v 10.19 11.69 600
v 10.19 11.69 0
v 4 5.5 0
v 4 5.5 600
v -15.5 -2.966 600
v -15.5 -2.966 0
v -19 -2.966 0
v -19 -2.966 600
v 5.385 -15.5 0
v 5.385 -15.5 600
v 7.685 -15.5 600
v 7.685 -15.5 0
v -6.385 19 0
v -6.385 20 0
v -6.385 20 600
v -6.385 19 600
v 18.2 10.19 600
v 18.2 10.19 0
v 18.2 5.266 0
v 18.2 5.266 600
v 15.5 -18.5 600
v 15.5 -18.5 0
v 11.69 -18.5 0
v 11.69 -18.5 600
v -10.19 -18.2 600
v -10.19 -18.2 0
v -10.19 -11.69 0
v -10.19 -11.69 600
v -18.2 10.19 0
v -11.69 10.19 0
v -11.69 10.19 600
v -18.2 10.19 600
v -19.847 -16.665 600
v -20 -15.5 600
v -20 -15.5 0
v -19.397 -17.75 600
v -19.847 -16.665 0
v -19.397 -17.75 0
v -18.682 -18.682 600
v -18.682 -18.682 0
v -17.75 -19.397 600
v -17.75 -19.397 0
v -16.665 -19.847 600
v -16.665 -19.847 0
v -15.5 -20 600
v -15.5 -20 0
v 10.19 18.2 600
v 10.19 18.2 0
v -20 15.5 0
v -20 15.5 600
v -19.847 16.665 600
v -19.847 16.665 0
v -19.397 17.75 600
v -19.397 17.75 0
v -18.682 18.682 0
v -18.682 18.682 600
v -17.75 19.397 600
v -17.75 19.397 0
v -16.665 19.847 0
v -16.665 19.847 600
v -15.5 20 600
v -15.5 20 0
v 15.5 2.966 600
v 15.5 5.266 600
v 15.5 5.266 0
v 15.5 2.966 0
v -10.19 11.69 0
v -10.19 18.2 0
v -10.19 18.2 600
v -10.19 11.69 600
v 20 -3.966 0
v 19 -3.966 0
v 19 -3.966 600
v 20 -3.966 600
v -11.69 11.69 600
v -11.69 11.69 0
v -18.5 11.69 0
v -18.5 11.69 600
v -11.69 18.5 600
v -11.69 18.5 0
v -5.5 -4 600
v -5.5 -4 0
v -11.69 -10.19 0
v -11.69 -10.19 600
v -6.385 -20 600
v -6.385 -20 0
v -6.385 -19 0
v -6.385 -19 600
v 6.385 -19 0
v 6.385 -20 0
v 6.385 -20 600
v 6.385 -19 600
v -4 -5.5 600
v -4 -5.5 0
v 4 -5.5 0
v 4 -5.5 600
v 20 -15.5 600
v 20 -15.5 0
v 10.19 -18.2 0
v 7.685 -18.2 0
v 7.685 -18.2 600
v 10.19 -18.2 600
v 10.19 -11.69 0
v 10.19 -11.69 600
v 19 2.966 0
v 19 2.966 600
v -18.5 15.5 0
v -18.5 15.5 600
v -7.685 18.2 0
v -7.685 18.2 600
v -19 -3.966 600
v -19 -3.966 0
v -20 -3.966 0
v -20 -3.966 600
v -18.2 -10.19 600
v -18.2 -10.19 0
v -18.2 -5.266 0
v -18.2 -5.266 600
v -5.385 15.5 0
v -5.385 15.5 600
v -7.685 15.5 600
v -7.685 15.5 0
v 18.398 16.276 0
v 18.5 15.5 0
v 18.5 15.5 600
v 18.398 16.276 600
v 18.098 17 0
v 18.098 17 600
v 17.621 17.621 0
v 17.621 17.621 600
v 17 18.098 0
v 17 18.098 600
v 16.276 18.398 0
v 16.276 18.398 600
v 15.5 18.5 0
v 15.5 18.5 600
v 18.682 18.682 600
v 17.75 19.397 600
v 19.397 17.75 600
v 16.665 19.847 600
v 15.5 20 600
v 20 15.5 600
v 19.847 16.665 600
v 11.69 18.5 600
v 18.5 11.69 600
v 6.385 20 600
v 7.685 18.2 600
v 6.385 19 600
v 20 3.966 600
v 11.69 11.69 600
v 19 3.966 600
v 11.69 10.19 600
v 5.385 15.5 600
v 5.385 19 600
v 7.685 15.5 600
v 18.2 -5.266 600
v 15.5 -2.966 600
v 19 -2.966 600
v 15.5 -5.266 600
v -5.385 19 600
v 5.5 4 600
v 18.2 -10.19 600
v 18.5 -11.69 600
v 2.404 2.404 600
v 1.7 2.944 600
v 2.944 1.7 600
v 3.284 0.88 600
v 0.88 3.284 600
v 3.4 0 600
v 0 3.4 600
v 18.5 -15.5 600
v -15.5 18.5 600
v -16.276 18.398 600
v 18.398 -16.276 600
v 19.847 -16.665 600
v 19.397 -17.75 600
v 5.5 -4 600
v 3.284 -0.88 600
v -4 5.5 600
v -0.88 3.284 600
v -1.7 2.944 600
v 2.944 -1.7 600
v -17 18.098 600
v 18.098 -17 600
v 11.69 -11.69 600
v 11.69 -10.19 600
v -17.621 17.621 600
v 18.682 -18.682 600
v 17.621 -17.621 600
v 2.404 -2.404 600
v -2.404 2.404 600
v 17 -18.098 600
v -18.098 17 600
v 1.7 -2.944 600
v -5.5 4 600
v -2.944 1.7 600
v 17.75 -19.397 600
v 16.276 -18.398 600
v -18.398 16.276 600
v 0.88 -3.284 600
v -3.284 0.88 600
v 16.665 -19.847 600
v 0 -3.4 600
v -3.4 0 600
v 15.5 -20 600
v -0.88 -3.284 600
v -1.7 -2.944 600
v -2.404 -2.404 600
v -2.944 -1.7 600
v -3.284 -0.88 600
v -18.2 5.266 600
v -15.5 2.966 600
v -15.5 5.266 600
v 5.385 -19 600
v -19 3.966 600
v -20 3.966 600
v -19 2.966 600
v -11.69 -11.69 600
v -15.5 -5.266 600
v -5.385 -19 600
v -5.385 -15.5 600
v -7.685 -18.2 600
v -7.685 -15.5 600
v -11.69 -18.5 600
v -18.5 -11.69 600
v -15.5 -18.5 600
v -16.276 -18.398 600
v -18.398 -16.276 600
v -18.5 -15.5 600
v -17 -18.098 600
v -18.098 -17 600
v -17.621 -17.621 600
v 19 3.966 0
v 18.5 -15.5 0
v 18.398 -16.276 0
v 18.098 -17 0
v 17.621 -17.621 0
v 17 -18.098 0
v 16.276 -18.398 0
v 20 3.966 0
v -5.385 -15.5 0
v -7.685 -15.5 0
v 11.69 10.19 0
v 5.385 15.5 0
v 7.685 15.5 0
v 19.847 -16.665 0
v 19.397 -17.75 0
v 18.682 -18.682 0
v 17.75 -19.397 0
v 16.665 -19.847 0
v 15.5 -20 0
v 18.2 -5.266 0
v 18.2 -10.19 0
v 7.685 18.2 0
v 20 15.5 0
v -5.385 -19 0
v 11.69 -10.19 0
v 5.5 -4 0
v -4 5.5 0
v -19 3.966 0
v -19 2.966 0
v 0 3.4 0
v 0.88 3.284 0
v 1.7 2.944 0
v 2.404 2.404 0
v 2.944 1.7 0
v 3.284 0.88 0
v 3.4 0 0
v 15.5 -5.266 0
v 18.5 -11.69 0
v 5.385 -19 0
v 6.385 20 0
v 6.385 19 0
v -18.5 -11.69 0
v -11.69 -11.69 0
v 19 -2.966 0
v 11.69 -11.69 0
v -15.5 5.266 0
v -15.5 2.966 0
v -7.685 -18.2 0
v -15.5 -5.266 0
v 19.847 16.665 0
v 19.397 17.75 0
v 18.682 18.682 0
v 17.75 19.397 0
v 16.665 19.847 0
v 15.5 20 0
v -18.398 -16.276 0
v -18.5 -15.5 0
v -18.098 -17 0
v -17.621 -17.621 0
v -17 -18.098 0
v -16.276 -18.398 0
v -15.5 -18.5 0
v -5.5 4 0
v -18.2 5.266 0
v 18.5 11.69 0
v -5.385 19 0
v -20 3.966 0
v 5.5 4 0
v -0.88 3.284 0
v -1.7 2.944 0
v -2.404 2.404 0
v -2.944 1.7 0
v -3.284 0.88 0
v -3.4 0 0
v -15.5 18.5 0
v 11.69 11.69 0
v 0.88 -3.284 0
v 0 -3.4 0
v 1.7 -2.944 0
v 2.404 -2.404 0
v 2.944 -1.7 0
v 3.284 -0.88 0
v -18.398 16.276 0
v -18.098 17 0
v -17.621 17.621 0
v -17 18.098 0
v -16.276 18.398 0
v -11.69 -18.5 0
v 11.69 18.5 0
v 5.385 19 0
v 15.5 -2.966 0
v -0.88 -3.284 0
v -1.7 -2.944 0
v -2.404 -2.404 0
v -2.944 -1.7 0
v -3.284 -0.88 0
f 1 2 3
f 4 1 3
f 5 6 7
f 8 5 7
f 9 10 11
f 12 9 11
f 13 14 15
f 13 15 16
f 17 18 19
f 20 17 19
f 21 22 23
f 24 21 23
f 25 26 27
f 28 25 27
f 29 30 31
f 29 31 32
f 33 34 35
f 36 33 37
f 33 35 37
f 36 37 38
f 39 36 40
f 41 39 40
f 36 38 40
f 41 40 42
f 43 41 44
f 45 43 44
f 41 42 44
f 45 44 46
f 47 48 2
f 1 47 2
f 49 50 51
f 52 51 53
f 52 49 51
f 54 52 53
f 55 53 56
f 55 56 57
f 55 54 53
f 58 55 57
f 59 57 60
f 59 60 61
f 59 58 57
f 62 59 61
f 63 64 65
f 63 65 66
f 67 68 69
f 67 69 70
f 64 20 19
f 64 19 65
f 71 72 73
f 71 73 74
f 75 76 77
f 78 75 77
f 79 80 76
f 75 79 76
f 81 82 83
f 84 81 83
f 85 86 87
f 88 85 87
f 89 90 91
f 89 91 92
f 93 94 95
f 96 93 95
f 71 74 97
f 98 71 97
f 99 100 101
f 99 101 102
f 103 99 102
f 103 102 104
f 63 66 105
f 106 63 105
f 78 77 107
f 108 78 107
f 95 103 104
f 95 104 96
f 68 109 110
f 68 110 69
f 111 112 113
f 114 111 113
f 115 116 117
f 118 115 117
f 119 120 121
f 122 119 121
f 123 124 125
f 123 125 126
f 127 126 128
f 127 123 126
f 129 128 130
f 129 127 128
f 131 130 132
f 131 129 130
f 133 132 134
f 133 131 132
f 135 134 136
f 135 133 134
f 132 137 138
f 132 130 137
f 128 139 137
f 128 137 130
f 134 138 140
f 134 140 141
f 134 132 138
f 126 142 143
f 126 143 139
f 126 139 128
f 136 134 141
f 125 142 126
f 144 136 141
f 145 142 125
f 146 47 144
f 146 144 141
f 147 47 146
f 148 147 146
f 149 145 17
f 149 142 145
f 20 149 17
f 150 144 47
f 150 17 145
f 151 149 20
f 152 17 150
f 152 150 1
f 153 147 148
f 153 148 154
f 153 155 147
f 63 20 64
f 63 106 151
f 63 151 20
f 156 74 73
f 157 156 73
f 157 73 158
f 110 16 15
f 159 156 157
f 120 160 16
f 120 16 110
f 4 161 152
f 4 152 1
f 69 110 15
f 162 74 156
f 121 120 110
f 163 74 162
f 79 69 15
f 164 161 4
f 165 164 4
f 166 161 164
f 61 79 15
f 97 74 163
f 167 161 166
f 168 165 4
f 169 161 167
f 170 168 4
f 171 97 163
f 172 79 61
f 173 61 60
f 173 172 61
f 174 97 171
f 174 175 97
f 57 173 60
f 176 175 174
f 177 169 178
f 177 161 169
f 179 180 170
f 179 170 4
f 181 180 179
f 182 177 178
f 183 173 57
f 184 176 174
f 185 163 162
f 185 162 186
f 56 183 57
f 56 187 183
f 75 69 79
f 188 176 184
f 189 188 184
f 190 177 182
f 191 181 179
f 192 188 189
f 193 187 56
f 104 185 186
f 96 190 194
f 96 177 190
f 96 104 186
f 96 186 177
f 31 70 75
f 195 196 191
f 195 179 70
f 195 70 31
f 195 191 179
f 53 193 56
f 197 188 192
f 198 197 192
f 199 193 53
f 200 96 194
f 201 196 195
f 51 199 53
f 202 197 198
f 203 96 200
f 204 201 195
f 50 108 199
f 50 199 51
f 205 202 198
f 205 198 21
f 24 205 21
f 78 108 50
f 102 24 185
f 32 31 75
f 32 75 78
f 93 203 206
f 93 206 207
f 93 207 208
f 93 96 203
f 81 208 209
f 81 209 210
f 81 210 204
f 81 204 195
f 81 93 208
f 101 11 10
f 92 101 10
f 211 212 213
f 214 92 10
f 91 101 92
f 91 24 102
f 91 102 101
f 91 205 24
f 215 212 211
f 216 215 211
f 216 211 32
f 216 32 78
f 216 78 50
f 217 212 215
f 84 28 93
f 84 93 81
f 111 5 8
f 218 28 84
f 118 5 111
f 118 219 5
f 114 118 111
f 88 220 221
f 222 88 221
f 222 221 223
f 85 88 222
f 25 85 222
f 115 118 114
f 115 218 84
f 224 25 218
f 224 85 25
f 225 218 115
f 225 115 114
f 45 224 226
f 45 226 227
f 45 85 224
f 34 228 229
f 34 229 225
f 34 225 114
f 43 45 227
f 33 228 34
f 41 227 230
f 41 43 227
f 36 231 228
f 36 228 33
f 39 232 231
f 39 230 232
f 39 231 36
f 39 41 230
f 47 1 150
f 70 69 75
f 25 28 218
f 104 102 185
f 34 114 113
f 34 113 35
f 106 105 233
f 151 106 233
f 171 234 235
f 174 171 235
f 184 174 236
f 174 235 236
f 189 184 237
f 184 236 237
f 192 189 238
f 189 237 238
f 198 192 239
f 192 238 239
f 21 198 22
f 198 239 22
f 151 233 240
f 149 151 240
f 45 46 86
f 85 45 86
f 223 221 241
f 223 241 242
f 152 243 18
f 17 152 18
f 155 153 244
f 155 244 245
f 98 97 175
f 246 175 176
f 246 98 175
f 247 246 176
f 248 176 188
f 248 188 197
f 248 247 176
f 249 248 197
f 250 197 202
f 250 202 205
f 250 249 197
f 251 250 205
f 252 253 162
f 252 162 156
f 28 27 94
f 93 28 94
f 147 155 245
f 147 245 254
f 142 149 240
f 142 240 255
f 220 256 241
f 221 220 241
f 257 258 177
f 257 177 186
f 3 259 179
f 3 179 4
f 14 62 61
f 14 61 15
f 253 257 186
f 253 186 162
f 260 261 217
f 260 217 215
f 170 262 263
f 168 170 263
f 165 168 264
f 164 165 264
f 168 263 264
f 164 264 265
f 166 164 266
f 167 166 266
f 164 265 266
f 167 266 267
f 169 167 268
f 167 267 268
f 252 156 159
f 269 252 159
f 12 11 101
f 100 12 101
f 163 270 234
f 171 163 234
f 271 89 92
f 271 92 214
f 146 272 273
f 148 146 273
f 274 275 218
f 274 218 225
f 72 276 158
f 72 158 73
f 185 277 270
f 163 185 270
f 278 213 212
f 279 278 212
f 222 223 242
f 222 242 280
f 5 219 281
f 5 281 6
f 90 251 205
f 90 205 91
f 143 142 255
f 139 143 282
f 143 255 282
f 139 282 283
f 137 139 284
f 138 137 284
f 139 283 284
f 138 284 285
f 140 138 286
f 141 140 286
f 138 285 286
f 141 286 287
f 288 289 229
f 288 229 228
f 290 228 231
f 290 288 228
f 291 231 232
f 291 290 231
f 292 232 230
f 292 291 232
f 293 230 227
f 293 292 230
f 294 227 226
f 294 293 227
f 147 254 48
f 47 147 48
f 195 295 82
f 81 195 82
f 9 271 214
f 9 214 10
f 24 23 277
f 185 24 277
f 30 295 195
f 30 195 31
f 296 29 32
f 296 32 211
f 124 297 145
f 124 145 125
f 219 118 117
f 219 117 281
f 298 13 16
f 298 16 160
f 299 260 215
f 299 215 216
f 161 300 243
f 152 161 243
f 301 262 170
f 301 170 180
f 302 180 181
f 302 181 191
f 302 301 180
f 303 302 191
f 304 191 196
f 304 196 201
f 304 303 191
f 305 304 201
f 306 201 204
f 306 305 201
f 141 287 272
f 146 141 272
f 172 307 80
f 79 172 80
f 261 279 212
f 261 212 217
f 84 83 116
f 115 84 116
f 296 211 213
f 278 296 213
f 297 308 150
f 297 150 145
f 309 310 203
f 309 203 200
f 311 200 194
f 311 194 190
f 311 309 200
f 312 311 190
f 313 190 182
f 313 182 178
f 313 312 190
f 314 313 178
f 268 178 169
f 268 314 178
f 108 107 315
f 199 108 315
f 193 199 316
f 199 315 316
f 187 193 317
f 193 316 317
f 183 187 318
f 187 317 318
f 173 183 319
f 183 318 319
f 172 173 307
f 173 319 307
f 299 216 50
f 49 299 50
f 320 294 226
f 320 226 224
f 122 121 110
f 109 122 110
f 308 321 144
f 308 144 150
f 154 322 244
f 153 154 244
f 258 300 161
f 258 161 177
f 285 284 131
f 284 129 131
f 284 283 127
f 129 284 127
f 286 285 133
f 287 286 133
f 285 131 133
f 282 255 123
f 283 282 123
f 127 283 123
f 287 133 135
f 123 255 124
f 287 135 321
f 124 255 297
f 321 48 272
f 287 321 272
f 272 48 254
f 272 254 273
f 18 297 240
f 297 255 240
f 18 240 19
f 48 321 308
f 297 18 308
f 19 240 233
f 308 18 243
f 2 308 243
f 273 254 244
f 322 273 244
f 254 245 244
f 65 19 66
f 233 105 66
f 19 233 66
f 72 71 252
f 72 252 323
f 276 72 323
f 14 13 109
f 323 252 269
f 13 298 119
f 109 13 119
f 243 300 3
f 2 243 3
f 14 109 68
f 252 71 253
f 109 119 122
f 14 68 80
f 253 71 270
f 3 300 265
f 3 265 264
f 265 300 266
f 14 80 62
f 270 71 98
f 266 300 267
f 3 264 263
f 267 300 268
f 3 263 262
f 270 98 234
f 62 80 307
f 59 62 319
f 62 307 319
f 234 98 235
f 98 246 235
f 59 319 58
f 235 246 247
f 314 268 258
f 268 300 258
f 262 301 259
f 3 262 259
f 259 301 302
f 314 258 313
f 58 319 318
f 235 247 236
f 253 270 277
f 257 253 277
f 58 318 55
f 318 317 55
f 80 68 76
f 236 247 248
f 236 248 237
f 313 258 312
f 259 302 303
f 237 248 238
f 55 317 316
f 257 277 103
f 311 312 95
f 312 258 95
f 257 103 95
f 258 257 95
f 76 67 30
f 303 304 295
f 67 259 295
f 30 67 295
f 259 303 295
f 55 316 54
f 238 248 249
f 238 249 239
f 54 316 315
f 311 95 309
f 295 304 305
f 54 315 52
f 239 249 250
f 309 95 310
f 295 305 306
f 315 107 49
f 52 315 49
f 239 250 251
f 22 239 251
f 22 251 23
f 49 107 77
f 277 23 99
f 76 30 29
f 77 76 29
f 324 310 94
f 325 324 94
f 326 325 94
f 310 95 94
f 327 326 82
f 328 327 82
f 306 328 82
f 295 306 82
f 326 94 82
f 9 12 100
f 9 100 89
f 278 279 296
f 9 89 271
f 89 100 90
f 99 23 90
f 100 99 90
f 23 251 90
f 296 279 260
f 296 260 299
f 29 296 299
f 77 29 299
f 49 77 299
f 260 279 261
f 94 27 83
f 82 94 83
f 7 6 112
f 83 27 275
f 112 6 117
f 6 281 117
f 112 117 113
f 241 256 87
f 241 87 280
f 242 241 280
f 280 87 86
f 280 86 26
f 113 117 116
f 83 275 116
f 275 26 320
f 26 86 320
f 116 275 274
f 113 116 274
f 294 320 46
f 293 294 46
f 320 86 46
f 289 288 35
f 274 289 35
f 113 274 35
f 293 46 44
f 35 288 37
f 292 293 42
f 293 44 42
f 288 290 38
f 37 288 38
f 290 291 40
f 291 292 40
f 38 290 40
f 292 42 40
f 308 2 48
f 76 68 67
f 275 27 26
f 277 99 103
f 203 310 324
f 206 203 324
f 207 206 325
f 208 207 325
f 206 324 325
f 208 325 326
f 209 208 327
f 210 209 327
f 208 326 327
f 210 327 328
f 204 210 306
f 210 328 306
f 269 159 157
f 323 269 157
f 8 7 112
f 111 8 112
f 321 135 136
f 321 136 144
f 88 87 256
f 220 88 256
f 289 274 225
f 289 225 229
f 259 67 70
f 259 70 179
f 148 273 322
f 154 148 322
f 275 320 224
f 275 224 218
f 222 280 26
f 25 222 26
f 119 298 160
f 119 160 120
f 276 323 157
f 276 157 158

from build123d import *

# Parameters (mm, degrees)
BOSS_EXTRUDE1_DEPTH  = 600
MIRROR3_COPY_1_DEPTH = 600
MIRROR3_COPY_2_DEPTH = 600


with BuildPart() as part:
    # Sketch1 → Boss-Extrude1 (new body)
    with BuildSketch(Plane.XY):
        with BuildLine():
            Line((3.4, 0), (5.5, 0))
            Line((5.5, 0), (5.5, 4))
            Line((5.5, 4), (11.69, 10.19))
            Line((11.69, 10.19), (18.2, 10.19))
            Line((18.2, 10.19), (18.2, 5.265595036))
            Line((18.2, 5.265595036), (15.5, 5.265595036))
            Line((15.5, 5.265595036), (15.5, 2.965595036))
            Line((15.5, 2.965595036), (19, 2.965595036))
            Line((19, 2.965595036), (19, 3.965595036))
            Line((19, 3.965595036), (20, 3.965595036))
            Line((20, 3.965595036), (20, 15.5))
            ThreePointArc((20, 15.5), (18.681980515, 18.681980515), (15.5, 20))
            Line((15.5, 20), (6.385304712, 20))
            Line((6.385304712, 20), (6.385304712, 19))
            Line((6.385304712, 19), (5.385304712, 19))
            Line((5.385304712, 19), (5.385304712, 15.5))
            Line((5.385304712, 15.5), (7.685304712, 15.5))
            Line((7.685304712, 15.5), (7.685304712, 18.2))
            Line((7.685304712, 18.2), (10.19, 18.2))
            Line((10.19, 18.2), (10.19, 11.69))
            Line((10.19, 11.69), (4, 5.5))
            Line((4, 5.5), (0, 5.5))
            Line((0, 5.5), (0, 3.4))
            ThreePointArc((0, 3.4), (2.404163056, 2.404163056), (3.4, 0))
        make_face()
        with BuildLine():
            Line((18.5, 11.69), (18.5, 15.5))
            ThreePointArc((18.5, 15.5), (17.621320344, 17.621320344), (15.5, 18.5))
            Line((15.5, 18.5), (11.69, 18.5))
            Line((11.69, 18.5), (11.69, 11.69))
            Line((11.69, 11.69), (18.5, 11.69))
        make_face(mode=Mode.SUBTRACT)
    boss_extrude1 = extrude(amount=BOSS_EXTRUDE1_DEPTH)

    # Mirror1: Boss-Extrude1 across plane
    add(boss_extrude1.mirror(Plane.ZX))

    # Mirror2: Boss-Extrude1 across plane
    add(boss_extrude1.mirror(Plane(origin=(0, 0, 0), x_dir=(0, 0, 1), z_dir=(1, 0, 0))))

    # Mirror3 copy 1 sketch → Mirror3 copy 1 (add)
    with BuildSketch(Plane(origin=(0, 0, 0), x_dir=(-1, 0, 0), z_dir=(0, 0, 1))):
        with BuildLine():
            Line((3.4, 0), (5.5, 0))
            Line((5.5, 0), (5.5, 4))
            Line((5.5, 4), (11.69, 10.19))
            Line((11.69, 10.19), (18.2, 10.19))
            Line((18.2, 10.19), (18.2, 5.265595036))
            Line((18.2, 5.265595036), (15.5, 5.265595036))
            Line((15.5, 5.265595036), (15.5, 2.965595036))
            Line((15.5, 2.965595036), (19, 2.965595036))
            Line((19, 2.965595036), (19, 3.965595036))
            Line((19, 3.965595036), (20, 3.965595036))
            Line((20, 3.965595036), (20, 15.5))
            ThreePointArc((20, 15.5), (18.681980515, 18.681980515), (15.5, 20))
            Line((15.5, 20), (6.385304712, 20))
            Line((6.385304712, 20), (6.385304712, 19))
            Line((6.385304712, 19), (5.385304712, 19))
            Line((5.385304712, 19), (5.385304712, 15.5))
            Line((5.385304712, 15.5), (7.685304712, 15.5))
            Line((7.685304712, 15.5), (7.685304712, 18.2))
            Line((7.685304712, 18.2), (10.19, 18.2))
            Line((10.19, 18.2), (10.19, 11.69))
            Line((10.19, 11.69), (4, 5.5))
            Line((4, 5.5), (0, 5.5))
            Line((0, 5.5), (0, 3.4))
            ThreePointArc((0, 3.4), (2.404163056, 2.404163056), (3.4, 0))
        make_face()
        with BuildLine():
            Line((18.5, 11.69), (18.5, 15.5))
            ThreePointArc((18.5, 15.5), (17.621320344, 17.621320344), (15.5, 18.5))
            Line((15.5, 18.5), (11.69, 18.5))
            Line((11.69, 18.5), (11.69, 11.69))
            Line((11.69, 11.69), (18.5, 11.69))
        make_face(mode=Mode.SUBTRACT)
    extrude(amount=MIRROR3_COPY_1_DEPTH)

    # Mirror3 copy 2 sketch → Mirror3 copy 2 (add)
    with BuildSketch(Plane.XY):
        with BuildLine():
            Line((3.4, 0), (5.5, 0))
            Line((5.5, 0), (5.5, -4))
            Line((5.5, -4), (11.69, -10.19))
            Line((11.69, -10.19), (18.2, -10.19))
            Line((18.2, -10.19), (18.2, -5.265595036))
            Line((18.2, -5.265595036), (15.5, -5.265595036))
            Line((15.5, -5.265595036), (15.5, -2.965595036))
            Line((15.5, -2.965595036), (19, -2.965595036))
            Line((19, -2.965595036), (19, -3.965595036))
            Line((19, -3.965595036), (20, -3.965595036))
            Line((20, -3.965595036), (20, -15.5))
            ThreePointArc((20, -15.5), (18.681980515, -18.681980515), (15.5, -20))
            Line((15.5, -20), (6.385304712, -20))
            Line((6.385304712, -20), (6.385304712, -19))
            Line((6.385304712, -19), (5.385304712, -19))
            Line((5.385304712, -19), (5.385304712, -15.5))
            Line((5.385304712, -15.5), (7.685304712, -15.5))
            Line((7.685304712, -15.5), (7.685304712, -18.2))
            Line((7.685304712, -18.2), (10.19, -18.2))
            Line((10.19, -18.2), (10.19, -11.69))
            Line((10.19, -11.69), (4, -5.5))
            Line((4, -5.5), (0, -5.5))
            Line((0, -5.5), (0, -3.4))
            ThreePointArc((0, -3.4), (2.404163056, -2.404163056), (3.4, 0))
        make_face()
        with BuildLine():
            Line((18.5, -11.69), (18.5, -15.5))
            ThreePointArc((18.5, -15.5), (17.621320344, -17.621320344), (15.5, -18.5))
            Line((15.5, -18.5), (11.69, -18.5))
            Line((11.69, -18.5), (11.69, -11.69))
            Line((11.69, -11.69), (18.5, -11.69))
        make_face(mode=Mode.SUBTRACT)
    extrude(amount=MIRROR3_COPY_2_DEPTH)


solid = part.part
